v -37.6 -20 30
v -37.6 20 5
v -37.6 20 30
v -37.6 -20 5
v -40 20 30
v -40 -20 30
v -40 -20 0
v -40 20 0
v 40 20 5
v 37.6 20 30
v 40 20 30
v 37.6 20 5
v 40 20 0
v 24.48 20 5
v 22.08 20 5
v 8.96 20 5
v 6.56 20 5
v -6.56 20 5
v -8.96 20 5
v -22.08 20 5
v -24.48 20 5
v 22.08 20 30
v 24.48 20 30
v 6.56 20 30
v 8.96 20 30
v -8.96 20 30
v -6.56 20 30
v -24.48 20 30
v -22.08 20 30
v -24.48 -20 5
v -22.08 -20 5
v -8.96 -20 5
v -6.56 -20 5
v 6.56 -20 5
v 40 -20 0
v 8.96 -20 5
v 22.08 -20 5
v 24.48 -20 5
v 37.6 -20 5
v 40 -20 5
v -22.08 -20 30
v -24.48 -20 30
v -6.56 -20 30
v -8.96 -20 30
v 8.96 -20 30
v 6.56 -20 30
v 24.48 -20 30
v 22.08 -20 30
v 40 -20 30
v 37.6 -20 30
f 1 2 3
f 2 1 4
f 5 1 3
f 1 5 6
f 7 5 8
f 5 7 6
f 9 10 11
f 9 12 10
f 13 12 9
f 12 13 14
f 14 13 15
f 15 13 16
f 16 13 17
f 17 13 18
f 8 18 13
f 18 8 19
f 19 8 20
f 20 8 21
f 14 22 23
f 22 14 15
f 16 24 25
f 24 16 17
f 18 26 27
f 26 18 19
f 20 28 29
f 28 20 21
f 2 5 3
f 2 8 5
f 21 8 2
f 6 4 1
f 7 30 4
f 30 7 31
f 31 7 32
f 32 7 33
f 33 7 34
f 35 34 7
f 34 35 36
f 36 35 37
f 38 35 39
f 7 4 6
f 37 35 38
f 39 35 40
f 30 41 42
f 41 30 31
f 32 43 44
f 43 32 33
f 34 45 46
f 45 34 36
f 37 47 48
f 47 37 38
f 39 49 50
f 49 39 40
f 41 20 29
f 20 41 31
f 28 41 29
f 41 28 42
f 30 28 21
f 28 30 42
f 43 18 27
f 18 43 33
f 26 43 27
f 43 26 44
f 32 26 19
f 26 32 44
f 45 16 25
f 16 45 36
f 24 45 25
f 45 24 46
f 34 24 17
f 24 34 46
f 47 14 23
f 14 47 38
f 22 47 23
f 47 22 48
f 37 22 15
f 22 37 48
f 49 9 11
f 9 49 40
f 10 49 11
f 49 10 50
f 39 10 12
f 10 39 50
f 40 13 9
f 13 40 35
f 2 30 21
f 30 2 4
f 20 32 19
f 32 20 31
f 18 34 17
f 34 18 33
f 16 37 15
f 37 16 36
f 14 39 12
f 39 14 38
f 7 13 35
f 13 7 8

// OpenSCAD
// t3-006 finned base plate
base_length = 80;
base_width = 40;
base_thickness = 5;
fin_count = 6;
fin_thickness = 2.4;
fin_height = 25;
fin_pitch = (base_length - fin_thickness) / (fin_count - 1);

union() {
    translate([-base_length / 2, -base_width / 2, 0])
        cube([base_length, base_width, base_thickness]);
    for (i = [0 : fin_count - 1])
        translate([-base_length / 2 + i * fin_pitch, -base_width / 2, base_thickness - 0.01])
            cube([fin_thickness, base_width, fin_height + 0.01]);
}
